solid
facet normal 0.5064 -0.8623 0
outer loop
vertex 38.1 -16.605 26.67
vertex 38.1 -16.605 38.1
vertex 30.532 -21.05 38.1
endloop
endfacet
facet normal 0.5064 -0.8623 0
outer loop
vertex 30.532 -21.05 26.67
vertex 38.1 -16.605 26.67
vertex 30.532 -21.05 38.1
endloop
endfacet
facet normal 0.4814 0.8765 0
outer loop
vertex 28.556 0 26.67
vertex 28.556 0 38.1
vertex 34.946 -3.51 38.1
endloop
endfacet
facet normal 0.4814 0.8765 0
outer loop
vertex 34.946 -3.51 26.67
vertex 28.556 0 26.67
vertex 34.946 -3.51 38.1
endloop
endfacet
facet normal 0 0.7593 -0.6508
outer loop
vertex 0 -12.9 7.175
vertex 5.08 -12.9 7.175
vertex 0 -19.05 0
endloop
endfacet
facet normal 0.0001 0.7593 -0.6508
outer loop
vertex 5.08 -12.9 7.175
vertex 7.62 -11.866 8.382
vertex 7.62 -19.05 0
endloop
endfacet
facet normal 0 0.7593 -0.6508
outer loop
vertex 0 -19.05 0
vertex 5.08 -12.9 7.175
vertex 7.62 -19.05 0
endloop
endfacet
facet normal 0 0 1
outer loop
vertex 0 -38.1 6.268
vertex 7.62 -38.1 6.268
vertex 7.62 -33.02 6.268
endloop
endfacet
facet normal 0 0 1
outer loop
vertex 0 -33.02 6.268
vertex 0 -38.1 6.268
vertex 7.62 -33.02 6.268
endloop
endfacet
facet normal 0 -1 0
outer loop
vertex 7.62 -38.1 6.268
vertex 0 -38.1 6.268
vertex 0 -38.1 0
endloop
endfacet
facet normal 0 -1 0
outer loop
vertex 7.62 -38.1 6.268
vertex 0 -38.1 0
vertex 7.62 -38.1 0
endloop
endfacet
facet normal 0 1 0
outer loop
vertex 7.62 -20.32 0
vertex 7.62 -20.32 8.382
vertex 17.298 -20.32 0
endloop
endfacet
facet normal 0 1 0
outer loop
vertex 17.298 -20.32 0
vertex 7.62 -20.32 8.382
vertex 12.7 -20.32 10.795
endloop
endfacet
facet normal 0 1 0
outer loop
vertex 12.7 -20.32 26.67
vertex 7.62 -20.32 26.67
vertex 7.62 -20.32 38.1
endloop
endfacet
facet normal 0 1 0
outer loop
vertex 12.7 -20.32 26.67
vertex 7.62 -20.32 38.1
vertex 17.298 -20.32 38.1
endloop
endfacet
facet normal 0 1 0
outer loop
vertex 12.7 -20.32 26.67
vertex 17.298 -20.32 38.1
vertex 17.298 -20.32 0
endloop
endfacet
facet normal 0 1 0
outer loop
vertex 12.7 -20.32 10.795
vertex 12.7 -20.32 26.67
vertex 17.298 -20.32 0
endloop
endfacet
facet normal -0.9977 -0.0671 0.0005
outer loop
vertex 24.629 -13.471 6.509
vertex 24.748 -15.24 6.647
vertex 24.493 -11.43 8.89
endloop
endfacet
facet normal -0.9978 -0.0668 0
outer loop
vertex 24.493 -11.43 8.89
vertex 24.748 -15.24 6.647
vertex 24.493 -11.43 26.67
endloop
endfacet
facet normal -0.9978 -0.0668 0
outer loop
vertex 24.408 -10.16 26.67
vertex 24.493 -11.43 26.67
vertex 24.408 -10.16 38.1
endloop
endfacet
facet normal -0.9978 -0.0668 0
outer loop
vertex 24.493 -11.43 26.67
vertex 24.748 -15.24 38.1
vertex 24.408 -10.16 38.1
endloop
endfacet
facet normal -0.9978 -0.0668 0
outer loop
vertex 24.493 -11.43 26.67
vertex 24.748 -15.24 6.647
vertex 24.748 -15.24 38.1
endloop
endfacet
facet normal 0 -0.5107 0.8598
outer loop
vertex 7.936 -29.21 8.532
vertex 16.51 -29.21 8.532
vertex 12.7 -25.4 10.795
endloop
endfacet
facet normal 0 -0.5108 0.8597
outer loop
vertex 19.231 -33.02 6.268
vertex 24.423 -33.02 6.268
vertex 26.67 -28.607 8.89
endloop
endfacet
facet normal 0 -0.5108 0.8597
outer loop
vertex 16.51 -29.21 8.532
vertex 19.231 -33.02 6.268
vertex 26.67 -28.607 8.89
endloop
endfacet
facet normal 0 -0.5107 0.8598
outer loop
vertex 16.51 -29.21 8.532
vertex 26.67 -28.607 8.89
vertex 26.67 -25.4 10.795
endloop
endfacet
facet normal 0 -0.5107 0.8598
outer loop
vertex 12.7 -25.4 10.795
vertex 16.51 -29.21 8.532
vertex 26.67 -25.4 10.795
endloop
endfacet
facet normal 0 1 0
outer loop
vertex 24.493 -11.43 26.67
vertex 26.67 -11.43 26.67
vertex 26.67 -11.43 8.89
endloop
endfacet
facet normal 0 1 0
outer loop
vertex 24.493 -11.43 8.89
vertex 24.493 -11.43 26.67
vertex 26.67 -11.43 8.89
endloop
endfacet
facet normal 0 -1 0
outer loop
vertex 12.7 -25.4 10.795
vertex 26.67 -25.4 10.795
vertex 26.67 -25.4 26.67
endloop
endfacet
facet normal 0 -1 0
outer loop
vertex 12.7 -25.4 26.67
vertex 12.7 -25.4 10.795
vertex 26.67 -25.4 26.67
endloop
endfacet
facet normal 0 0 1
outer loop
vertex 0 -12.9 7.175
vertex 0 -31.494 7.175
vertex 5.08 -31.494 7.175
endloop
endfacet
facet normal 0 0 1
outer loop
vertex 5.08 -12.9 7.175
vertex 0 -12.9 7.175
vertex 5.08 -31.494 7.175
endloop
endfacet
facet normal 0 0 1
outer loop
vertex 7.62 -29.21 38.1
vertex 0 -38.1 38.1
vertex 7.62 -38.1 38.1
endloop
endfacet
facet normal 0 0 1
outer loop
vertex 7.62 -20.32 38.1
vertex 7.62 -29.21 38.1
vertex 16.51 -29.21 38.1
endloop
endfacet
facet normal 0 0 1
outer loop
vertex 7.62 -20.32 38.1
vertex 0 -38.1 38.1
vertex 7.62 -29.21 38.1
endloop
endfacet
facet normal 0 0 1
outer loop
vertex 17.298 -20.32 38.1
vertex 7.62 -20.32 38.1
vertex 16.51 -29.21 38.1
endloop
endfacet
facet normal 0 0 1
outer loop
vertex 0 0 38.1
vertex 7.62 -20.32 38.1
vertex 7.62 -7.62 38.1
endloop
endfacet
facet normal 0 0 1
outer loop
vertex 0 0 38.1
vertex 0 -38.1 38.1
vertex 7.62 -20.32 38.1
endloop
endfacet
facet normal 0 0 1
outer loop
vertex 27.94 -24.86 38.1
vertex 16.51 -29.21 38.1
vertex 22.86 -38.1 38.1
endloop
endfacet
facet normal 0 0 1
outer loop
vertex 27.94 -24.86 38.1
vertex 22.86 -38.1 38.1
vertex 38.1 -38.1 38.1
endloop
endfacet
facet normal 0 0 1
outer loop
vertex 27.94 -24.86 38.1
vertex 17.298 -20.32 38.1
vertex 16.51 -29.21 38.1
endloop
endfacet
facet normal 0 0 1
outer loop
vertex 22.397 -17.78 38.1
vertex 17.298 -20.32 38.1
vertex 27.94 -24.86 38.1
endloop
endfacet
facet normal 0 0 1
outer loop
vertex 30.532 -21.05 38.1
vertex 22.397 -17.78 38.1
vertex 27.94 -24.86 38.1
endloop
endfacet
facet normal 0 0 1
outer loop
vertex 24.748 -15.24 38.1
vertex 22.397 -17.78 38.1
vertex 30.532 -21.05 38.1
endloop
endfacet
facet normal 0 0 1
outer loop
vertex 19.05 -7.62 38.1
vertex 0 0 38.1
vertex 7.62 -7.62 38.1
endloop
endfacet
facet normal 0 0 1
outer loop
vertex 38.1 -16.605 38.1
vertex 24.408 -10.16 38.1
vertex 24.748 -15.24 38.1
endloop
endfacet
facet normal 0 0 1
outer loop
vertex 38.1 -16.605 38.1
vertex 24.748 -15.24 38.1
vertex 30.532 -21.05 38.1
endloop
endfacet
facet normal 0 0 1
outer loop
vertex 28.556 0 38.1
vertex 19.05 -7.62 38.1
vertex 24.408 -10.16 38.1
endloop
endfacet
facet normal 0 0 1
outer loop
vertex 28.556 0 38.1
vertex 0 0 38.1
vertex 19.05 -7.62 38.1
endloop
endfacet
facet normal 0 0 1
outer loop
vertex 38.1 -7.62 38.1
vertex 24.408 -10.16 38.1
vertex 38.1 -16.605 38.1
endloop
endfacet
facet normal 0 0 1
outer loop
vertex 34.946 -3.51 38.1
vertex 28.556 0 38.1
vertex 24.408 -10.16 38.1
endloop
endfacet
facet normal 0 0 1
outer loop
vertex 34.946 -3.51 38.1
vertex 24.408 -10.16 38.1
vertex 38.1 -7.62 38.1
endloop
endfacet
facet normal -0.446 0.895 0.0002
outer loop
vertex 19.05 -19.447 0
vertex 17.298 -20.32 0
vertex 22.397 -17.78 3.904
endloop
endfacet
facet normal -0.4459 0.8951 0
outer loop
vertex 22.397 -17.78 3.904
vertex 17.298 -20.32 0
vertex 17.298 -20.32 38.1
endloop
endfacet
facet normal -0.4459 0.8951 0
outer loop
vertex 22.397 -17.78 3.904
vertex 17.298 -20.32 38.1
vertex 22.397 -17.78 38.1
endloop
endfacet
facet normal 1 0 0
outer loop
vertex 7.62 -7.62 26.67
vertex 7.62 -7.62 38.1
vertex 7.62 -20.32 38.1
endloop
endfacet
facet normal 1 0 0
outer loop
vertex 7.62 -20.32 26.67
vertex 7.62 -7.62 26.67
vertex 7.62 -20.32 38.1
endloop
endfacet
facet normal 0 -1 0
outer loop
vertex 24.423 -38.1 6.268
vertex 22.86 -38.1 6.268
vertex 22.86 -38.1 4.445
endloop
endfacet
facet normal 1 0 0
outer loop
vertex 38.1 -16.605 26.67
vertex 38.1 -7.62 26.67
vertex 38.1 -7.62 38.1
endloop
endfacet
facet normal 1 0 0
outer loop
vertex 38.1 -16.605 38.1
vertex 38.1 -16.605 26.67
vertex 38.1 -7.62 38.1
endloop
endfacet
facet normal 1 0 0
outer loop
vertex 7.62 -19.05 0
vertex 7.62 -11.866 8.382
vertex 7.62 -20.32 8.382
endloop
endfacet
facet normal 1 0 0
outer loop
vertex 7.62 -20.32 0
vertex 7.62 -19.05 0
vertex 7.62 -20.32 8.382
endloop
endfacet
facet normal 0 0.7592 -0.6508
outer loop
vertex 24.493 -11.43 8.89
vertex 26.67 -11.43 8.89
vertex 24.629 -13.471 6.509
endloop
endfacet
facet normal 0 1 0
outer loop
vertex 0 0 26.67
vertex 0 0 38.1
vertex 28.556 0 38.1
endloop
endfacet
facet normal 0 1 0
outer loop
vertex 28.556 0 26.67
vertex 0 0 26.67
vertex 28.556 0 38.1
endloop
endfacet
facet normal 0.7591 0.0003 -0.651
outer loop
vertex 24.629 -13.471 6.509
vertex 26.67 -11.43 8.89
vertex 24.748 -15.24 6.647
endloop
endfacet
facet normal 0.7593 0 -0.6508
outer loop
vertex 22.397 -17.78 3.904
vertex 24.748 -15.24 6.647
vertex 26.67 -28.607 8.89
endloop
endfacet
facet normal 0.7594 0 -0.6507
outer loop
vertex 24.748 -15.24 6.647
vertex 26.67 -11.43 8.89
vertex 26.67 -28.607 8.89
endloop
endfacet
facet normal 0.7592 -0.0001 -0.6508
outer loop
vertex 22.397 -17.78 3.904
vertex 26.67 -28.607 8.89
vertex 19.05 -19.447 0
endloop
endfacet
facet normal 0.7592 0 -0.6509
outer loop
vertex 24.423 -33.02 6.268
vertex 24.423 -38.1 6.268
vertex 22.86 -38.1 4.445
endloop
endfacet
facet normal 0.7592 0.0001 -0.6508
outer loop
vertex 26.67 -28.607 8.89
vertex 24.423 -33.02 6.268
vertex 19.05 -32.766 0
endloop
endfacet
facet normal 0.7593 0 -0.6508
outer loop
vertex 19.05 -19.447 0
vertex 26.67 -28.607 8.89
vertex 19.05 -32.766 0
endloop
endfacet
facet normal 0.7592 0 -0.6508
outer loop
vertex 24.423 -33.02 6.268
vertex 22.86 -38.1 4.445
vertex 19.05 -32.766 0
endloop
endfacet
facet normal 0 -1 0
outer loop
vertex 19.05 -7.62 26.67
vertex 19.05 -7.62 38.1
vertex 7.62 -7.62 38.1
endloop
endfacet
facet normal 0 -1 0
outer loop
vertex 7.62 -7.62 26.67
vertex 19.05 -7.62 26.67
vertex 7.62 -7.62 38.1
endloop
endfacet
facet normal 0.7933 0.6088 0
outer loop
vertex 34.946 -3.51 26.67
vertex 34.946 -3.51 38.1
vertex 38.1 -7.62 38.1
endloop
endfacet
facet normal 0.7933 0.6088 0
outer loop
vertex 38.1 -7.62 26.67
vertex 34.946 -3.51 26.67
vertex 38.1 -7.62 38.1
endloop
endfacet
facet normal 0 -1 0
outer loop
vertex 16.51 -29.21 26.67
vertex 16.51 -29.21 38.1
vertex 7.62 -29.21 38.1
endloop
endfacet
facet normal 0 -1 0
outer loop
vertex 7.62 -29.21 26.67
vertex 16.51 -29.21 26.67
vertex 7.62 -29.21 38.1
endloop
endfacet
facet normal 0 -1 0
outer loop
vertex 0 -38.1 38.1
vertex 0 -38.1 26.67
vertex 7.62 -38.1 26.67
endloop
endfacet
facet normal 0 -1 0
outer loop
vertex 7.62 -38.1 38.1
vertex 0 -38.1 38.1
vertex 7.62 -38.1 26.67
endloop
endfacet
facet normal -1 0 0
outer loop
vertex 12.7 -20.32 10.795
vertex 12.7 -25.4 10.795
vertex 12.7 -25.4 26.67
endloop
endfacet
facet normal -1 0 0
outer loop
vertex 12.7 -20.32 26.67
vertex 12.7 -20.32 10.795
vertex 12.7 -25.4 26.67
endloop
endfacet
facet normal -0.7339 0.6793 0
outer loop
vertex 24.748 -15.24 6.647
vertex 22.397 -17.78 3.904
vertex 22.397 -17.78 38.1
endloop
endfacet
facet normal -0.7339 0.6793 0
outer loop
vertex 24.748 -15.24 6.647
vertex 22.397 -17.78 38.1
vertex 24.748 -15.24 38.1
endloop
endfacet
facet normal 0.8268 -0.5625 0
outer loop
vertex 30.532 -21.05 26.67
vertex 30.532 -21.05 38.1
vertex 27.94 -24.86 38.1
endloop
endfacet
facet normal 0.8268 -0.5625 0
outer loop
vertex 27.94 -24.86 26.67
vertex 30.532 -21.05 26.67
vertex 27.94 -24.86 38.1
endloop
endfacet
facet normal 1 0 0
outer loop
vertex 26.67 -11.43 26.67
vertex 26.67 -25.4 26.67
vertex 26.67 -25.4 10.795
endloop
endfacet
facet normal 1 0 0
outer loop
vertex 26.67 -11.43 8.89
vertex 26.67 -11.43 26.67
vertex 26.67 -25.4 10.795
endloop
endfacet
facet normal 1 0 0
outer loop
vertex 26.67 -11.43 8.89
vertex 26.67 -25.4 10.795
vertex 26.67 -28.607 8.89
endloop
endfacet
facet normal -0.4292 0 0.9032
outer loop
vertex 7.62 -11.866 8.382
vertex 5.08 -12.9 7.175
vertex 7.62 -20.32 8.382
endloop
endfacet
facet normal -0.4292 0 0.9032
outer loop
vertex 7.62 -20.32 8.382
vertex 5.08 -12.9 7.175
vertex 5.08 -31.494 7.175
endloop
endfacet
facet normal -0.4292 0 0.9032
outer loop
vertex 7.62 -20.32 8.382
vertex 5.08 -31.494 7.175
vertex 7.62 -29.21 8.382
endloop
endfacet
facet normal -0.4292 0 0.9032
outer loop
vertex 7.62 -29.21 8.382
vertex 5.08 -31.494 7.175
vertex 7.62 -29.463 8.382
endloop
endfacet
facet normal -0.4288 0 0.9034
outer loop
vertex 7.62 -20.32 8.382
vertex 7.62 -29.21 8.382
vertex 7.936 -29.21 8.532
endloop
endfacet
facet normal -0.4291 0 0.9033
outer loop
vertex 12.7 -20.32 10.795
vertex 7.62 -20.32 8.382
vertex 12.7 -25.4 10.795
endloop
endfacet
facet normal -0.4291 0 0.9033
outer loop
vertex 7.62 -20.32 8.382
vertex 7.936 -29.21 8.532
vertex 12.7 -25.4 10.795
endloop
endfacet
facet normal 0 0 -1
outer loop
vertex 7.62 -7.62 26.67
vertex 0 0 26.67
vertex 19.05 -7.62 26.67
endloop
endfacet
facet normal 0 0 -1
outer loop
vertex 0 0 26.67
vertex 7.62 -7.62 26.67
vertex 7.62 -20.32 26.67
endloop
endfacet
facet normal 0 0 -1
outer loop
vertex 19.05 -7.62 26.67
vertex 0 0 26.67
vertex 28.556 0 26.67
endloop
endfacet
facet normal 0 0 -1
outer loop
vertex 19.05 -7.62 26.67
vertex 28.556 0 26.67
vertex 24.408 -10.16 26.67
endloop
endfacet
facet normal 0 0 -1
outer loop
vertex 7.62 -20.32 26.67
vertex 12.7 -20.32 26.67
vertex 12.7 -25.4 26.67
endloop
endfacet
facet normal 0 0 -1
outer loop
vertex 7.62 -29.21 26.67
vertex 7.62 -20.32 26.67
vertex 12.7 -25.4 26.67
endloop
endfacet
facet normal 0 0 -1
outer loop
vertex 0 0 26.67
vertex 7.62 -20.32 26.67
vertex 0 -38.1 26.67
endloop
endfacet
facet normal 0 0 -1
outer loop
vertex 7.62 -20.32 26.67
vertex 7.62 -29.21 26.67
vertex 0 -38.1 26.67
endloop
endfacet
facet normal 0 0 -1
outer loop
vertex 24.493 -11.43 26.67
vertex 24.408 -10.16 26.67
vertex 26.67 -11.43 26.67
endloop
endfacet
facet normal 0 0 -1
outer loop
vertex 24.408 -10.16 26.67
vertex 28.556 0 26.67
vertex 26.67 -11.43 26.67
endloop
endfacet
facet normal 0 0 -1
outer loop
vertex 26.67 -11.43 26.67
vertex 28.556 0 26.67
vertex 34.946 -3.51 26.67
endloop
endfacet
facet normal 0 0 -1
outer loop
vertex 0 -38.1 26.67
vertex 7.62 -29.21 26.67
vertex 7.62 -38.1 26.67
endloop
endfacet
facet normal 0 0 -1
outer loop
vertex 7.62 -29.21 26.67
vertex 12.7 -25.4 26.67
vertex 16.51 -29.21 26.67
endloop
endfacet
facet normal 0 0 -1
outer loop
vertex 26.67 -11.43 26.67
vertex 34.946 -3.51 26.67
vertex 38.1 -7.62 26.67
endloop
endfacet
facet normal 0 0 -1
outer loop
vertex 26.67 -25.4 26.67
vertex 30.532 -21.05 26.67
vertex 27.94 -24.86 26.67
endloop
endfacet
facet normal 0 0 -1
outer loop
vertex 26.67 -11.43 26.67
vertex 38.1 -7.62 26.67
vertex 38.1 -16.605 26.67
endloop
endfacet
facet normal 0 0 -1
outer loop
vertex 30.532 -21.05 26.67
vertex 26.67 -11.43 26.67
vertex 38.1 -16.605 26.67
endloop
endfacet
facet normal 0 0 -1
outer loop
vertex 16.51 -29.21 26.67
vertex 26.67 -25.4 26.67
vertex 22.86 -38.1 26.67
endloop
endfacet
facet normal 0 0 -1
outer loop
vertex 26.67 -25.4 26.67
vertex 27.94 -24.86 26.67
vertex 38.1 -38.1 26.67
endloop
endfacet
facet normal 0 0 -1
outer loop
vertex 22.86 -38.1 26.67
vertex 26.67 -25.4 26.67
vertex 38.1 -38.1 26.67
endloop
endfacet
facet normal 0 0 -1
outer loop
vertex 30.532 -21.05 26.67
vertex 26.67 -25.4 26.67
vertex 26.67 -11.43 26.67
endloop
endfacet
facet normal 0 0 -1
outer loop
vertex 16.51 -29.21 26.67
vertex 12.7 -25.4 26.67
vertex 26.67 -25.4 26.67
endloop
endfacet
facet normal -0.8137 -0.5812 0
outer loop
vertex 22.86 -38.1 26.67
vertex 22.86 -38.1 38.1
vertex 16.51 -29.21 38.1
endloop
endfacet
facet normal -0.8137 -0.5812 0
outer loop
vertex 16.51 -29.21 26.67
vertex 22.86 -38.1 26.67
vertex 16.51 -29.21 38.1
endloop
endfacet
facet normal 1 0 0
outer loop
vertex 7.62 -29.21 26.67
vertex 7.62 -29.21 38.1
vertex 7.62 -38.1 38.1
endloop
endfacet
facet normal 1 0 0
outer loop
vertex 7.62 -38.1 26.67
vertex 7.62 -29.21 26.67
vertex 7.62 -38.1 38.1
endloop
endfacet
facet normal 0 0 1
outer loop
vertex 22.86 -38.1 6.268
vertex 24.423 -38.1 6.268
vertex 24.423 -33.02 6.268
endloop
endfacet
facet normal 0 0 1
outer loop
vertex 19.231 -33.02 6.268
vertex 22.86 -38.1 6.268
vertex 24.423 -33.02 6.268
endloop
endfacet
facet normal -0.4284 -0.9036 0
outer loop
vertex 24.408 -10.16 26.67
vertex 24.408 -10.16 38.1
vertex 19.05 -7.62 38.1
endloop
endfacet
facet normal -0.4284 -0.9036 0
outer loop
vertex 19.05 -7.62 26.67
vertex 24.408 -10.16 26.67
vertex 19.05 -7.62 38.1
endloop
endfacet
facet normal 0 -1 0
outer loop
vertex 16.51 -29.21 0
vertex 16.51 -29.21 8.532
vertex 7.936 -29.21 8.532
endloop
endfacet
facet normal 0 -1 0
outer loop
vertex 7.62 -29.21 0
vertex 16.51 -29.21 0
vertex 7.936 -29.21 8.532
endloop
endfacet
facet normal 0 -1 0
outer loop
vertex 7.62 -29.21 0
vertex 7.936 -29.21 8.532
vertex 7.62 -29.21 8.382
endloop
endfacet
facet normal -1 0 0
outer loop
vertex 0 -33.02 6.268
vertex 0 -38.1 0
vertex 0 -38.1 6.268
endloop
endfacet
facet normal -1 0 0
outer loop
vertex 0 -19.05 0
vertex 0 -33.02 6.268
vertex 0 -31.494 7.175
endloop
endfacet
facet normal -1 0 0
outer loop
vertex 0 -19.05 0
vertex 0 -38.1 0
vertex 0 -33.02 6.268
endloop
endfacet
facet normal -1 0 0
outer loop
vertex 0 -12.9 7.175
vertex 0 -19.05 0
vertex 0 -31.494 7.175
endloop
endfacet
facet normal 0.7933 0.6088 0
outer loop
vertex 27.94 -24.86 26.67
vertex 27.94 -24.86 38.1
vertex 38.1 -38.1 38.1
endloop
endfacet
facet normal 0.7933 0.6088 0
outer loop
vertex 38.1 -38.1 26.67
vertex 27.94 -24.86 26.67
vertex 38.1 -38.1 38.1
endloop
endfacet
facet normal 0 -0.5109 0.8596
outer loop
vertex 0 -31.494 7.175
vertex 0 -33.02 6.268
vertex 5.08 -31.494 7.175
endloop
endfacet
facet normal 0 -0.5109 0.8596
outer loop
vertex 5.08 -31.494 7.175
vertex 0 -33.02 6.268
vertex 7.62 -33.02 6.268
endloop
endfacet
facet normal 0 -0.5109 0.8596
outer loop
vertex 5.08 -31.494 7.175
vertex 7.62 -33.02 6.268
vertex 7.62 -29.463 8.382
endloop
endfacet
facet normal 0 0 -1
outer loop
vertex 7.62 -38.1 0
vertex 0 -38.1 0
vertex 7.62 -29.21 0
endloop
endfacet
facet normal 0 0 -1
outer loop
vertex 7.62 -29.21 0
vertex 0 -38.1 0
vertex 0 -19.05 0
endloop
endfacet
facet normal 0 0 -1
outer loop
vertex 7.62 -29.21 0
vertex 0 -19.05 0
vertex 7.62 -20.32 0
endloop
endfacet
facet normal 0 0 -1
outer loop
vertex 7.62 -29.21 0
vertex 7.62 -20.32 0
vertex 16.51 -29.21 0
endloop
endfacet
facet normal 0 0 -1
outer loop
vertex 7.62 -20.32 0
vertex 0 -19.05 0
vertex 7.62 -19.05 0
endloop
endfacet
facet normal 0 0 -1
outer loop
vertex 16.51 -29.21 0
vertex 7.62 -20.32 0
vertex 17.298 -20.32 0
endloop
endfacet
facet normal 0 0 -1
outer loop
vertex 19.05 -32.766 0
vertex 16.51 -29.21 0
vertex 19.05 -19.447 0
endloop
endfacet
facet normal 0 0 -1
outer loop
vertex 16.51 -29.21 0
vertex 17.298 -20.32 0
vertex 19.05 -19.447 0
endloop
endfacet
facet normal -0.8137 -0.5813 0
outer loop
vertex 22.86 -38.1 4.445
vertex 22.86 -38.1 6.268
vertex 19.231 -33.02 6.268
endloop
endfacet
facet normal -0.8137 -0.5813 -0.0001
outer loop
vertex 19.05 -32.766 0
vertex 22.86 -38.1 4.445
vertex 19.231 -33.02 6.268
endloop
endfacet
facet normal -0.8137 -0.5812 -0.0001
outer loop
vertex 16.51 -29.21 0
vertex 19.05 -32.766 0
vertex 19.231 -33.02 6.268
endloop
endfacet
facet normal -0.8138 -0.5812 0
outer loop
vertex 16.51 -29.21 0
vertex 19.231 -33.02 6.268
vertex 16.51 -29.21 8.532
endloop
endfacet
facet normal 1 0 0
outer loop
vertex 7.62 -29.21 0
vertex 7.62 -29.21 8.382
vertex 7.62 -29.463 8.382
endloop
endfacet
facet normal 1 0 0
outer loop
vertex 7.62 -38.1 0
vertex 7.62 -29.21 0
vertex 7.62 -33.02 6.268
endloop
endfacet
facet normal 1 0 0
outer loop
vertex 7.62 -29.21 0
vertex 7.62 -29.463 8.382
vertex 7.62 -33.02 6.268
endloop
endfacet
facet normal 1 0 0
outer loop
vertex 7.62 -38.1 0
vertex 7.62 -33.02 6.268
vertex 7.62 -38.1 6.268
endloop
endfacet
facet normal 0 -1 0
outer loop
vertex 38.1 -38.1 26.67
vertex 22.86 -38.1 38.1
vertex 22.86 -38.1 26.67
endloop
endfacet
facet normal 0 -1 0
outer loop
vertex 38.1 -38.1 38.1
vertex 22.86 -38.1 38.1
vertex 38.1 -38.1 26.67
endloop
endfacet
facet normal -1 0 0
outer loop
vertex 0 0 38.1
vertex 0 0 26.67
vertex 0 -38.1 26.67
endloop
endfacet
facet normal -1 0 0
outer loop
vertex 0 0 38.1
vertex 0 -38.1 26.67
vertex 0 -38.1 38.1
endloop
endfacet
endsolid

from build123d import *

# Parameters (mm, degrees)
F3_W      = 38.1
F3_H      = 38.1
F4_DEPTH  = 38.1
F6_DEPTH  = 38.1
F8_DEPTH  = 38.1
F10_DEPTH = 38.1


with BuildPart() as f4:
    # F3 (on Front) → F4 (new body)
    with BuildSketch(Plane.XZ):
        with Locations((19.05, 19.05)):
            Rectangle(F3_W, F3_H)
    extrude(amount=F4_DEPTH)

    # F5 (on offset) → F6 (cut)
    with BuildSketch(Plane.XZ.offset(38.1)):
        Polygon((0, 26.67), (0, 7.174831), (5.08, 7.174831), (12.7, 10.795), (12.7, 26.67), align=None)
        Polygon((26.67, 8.89), (19.05, 0), (38.1, 0), (38.1, 26.67), (26.67, 26.67), align=None)
    extrude(amount=-F6_DEPTH, mode=Mode.SUBTRACT)

    # F7 (on offset) → F8 (cut)
    with BuildSketch(Plane.YZ.offset(38.1)):
        Polygon((-38.1, 26.67), (-38.1, 6.268343), (-33.02, 6.268343), (-25.4, 10.795), (-25.4, 26.67), align=None)
        Polygon((-19.05, 0), (0, 0), (0, 26.67), (-11.43, 26.67), (-11.43, 8.89), align=None)
    extrude(amount=-F8_DEPTH, mode=Mode.SUBTRACT)

    # F9 (on offset) → F10 (cut)
    with BuildSketch(Plane.XY.offset(38.1)):
        Polygon((7.62, -29.21), (7.62, -38.1), (22.86, -38.1), (16.51, -29.21), align=None)
        Polygon((19.05, -7.62), (7.62, -7.62), (7.62, -20.32), (17.297857, -20.32), (22.396552, -17.78), (24.747821, -15.24), (24.407931, -10.16), align=None)
        Polygon((38.1, -38.1), (38.1, -16.605278), (30.532379, -21.050278), (27.94, -24.860278), align=None)
        Polygon((38.1, 0), (28.555734, 0), (34.945868, -3.50978), (38.1, -7.62), align=None)
    extrude(amount=-F10_DEPTH, mode=Mode.SUBTRACT)


solid = f4.part
